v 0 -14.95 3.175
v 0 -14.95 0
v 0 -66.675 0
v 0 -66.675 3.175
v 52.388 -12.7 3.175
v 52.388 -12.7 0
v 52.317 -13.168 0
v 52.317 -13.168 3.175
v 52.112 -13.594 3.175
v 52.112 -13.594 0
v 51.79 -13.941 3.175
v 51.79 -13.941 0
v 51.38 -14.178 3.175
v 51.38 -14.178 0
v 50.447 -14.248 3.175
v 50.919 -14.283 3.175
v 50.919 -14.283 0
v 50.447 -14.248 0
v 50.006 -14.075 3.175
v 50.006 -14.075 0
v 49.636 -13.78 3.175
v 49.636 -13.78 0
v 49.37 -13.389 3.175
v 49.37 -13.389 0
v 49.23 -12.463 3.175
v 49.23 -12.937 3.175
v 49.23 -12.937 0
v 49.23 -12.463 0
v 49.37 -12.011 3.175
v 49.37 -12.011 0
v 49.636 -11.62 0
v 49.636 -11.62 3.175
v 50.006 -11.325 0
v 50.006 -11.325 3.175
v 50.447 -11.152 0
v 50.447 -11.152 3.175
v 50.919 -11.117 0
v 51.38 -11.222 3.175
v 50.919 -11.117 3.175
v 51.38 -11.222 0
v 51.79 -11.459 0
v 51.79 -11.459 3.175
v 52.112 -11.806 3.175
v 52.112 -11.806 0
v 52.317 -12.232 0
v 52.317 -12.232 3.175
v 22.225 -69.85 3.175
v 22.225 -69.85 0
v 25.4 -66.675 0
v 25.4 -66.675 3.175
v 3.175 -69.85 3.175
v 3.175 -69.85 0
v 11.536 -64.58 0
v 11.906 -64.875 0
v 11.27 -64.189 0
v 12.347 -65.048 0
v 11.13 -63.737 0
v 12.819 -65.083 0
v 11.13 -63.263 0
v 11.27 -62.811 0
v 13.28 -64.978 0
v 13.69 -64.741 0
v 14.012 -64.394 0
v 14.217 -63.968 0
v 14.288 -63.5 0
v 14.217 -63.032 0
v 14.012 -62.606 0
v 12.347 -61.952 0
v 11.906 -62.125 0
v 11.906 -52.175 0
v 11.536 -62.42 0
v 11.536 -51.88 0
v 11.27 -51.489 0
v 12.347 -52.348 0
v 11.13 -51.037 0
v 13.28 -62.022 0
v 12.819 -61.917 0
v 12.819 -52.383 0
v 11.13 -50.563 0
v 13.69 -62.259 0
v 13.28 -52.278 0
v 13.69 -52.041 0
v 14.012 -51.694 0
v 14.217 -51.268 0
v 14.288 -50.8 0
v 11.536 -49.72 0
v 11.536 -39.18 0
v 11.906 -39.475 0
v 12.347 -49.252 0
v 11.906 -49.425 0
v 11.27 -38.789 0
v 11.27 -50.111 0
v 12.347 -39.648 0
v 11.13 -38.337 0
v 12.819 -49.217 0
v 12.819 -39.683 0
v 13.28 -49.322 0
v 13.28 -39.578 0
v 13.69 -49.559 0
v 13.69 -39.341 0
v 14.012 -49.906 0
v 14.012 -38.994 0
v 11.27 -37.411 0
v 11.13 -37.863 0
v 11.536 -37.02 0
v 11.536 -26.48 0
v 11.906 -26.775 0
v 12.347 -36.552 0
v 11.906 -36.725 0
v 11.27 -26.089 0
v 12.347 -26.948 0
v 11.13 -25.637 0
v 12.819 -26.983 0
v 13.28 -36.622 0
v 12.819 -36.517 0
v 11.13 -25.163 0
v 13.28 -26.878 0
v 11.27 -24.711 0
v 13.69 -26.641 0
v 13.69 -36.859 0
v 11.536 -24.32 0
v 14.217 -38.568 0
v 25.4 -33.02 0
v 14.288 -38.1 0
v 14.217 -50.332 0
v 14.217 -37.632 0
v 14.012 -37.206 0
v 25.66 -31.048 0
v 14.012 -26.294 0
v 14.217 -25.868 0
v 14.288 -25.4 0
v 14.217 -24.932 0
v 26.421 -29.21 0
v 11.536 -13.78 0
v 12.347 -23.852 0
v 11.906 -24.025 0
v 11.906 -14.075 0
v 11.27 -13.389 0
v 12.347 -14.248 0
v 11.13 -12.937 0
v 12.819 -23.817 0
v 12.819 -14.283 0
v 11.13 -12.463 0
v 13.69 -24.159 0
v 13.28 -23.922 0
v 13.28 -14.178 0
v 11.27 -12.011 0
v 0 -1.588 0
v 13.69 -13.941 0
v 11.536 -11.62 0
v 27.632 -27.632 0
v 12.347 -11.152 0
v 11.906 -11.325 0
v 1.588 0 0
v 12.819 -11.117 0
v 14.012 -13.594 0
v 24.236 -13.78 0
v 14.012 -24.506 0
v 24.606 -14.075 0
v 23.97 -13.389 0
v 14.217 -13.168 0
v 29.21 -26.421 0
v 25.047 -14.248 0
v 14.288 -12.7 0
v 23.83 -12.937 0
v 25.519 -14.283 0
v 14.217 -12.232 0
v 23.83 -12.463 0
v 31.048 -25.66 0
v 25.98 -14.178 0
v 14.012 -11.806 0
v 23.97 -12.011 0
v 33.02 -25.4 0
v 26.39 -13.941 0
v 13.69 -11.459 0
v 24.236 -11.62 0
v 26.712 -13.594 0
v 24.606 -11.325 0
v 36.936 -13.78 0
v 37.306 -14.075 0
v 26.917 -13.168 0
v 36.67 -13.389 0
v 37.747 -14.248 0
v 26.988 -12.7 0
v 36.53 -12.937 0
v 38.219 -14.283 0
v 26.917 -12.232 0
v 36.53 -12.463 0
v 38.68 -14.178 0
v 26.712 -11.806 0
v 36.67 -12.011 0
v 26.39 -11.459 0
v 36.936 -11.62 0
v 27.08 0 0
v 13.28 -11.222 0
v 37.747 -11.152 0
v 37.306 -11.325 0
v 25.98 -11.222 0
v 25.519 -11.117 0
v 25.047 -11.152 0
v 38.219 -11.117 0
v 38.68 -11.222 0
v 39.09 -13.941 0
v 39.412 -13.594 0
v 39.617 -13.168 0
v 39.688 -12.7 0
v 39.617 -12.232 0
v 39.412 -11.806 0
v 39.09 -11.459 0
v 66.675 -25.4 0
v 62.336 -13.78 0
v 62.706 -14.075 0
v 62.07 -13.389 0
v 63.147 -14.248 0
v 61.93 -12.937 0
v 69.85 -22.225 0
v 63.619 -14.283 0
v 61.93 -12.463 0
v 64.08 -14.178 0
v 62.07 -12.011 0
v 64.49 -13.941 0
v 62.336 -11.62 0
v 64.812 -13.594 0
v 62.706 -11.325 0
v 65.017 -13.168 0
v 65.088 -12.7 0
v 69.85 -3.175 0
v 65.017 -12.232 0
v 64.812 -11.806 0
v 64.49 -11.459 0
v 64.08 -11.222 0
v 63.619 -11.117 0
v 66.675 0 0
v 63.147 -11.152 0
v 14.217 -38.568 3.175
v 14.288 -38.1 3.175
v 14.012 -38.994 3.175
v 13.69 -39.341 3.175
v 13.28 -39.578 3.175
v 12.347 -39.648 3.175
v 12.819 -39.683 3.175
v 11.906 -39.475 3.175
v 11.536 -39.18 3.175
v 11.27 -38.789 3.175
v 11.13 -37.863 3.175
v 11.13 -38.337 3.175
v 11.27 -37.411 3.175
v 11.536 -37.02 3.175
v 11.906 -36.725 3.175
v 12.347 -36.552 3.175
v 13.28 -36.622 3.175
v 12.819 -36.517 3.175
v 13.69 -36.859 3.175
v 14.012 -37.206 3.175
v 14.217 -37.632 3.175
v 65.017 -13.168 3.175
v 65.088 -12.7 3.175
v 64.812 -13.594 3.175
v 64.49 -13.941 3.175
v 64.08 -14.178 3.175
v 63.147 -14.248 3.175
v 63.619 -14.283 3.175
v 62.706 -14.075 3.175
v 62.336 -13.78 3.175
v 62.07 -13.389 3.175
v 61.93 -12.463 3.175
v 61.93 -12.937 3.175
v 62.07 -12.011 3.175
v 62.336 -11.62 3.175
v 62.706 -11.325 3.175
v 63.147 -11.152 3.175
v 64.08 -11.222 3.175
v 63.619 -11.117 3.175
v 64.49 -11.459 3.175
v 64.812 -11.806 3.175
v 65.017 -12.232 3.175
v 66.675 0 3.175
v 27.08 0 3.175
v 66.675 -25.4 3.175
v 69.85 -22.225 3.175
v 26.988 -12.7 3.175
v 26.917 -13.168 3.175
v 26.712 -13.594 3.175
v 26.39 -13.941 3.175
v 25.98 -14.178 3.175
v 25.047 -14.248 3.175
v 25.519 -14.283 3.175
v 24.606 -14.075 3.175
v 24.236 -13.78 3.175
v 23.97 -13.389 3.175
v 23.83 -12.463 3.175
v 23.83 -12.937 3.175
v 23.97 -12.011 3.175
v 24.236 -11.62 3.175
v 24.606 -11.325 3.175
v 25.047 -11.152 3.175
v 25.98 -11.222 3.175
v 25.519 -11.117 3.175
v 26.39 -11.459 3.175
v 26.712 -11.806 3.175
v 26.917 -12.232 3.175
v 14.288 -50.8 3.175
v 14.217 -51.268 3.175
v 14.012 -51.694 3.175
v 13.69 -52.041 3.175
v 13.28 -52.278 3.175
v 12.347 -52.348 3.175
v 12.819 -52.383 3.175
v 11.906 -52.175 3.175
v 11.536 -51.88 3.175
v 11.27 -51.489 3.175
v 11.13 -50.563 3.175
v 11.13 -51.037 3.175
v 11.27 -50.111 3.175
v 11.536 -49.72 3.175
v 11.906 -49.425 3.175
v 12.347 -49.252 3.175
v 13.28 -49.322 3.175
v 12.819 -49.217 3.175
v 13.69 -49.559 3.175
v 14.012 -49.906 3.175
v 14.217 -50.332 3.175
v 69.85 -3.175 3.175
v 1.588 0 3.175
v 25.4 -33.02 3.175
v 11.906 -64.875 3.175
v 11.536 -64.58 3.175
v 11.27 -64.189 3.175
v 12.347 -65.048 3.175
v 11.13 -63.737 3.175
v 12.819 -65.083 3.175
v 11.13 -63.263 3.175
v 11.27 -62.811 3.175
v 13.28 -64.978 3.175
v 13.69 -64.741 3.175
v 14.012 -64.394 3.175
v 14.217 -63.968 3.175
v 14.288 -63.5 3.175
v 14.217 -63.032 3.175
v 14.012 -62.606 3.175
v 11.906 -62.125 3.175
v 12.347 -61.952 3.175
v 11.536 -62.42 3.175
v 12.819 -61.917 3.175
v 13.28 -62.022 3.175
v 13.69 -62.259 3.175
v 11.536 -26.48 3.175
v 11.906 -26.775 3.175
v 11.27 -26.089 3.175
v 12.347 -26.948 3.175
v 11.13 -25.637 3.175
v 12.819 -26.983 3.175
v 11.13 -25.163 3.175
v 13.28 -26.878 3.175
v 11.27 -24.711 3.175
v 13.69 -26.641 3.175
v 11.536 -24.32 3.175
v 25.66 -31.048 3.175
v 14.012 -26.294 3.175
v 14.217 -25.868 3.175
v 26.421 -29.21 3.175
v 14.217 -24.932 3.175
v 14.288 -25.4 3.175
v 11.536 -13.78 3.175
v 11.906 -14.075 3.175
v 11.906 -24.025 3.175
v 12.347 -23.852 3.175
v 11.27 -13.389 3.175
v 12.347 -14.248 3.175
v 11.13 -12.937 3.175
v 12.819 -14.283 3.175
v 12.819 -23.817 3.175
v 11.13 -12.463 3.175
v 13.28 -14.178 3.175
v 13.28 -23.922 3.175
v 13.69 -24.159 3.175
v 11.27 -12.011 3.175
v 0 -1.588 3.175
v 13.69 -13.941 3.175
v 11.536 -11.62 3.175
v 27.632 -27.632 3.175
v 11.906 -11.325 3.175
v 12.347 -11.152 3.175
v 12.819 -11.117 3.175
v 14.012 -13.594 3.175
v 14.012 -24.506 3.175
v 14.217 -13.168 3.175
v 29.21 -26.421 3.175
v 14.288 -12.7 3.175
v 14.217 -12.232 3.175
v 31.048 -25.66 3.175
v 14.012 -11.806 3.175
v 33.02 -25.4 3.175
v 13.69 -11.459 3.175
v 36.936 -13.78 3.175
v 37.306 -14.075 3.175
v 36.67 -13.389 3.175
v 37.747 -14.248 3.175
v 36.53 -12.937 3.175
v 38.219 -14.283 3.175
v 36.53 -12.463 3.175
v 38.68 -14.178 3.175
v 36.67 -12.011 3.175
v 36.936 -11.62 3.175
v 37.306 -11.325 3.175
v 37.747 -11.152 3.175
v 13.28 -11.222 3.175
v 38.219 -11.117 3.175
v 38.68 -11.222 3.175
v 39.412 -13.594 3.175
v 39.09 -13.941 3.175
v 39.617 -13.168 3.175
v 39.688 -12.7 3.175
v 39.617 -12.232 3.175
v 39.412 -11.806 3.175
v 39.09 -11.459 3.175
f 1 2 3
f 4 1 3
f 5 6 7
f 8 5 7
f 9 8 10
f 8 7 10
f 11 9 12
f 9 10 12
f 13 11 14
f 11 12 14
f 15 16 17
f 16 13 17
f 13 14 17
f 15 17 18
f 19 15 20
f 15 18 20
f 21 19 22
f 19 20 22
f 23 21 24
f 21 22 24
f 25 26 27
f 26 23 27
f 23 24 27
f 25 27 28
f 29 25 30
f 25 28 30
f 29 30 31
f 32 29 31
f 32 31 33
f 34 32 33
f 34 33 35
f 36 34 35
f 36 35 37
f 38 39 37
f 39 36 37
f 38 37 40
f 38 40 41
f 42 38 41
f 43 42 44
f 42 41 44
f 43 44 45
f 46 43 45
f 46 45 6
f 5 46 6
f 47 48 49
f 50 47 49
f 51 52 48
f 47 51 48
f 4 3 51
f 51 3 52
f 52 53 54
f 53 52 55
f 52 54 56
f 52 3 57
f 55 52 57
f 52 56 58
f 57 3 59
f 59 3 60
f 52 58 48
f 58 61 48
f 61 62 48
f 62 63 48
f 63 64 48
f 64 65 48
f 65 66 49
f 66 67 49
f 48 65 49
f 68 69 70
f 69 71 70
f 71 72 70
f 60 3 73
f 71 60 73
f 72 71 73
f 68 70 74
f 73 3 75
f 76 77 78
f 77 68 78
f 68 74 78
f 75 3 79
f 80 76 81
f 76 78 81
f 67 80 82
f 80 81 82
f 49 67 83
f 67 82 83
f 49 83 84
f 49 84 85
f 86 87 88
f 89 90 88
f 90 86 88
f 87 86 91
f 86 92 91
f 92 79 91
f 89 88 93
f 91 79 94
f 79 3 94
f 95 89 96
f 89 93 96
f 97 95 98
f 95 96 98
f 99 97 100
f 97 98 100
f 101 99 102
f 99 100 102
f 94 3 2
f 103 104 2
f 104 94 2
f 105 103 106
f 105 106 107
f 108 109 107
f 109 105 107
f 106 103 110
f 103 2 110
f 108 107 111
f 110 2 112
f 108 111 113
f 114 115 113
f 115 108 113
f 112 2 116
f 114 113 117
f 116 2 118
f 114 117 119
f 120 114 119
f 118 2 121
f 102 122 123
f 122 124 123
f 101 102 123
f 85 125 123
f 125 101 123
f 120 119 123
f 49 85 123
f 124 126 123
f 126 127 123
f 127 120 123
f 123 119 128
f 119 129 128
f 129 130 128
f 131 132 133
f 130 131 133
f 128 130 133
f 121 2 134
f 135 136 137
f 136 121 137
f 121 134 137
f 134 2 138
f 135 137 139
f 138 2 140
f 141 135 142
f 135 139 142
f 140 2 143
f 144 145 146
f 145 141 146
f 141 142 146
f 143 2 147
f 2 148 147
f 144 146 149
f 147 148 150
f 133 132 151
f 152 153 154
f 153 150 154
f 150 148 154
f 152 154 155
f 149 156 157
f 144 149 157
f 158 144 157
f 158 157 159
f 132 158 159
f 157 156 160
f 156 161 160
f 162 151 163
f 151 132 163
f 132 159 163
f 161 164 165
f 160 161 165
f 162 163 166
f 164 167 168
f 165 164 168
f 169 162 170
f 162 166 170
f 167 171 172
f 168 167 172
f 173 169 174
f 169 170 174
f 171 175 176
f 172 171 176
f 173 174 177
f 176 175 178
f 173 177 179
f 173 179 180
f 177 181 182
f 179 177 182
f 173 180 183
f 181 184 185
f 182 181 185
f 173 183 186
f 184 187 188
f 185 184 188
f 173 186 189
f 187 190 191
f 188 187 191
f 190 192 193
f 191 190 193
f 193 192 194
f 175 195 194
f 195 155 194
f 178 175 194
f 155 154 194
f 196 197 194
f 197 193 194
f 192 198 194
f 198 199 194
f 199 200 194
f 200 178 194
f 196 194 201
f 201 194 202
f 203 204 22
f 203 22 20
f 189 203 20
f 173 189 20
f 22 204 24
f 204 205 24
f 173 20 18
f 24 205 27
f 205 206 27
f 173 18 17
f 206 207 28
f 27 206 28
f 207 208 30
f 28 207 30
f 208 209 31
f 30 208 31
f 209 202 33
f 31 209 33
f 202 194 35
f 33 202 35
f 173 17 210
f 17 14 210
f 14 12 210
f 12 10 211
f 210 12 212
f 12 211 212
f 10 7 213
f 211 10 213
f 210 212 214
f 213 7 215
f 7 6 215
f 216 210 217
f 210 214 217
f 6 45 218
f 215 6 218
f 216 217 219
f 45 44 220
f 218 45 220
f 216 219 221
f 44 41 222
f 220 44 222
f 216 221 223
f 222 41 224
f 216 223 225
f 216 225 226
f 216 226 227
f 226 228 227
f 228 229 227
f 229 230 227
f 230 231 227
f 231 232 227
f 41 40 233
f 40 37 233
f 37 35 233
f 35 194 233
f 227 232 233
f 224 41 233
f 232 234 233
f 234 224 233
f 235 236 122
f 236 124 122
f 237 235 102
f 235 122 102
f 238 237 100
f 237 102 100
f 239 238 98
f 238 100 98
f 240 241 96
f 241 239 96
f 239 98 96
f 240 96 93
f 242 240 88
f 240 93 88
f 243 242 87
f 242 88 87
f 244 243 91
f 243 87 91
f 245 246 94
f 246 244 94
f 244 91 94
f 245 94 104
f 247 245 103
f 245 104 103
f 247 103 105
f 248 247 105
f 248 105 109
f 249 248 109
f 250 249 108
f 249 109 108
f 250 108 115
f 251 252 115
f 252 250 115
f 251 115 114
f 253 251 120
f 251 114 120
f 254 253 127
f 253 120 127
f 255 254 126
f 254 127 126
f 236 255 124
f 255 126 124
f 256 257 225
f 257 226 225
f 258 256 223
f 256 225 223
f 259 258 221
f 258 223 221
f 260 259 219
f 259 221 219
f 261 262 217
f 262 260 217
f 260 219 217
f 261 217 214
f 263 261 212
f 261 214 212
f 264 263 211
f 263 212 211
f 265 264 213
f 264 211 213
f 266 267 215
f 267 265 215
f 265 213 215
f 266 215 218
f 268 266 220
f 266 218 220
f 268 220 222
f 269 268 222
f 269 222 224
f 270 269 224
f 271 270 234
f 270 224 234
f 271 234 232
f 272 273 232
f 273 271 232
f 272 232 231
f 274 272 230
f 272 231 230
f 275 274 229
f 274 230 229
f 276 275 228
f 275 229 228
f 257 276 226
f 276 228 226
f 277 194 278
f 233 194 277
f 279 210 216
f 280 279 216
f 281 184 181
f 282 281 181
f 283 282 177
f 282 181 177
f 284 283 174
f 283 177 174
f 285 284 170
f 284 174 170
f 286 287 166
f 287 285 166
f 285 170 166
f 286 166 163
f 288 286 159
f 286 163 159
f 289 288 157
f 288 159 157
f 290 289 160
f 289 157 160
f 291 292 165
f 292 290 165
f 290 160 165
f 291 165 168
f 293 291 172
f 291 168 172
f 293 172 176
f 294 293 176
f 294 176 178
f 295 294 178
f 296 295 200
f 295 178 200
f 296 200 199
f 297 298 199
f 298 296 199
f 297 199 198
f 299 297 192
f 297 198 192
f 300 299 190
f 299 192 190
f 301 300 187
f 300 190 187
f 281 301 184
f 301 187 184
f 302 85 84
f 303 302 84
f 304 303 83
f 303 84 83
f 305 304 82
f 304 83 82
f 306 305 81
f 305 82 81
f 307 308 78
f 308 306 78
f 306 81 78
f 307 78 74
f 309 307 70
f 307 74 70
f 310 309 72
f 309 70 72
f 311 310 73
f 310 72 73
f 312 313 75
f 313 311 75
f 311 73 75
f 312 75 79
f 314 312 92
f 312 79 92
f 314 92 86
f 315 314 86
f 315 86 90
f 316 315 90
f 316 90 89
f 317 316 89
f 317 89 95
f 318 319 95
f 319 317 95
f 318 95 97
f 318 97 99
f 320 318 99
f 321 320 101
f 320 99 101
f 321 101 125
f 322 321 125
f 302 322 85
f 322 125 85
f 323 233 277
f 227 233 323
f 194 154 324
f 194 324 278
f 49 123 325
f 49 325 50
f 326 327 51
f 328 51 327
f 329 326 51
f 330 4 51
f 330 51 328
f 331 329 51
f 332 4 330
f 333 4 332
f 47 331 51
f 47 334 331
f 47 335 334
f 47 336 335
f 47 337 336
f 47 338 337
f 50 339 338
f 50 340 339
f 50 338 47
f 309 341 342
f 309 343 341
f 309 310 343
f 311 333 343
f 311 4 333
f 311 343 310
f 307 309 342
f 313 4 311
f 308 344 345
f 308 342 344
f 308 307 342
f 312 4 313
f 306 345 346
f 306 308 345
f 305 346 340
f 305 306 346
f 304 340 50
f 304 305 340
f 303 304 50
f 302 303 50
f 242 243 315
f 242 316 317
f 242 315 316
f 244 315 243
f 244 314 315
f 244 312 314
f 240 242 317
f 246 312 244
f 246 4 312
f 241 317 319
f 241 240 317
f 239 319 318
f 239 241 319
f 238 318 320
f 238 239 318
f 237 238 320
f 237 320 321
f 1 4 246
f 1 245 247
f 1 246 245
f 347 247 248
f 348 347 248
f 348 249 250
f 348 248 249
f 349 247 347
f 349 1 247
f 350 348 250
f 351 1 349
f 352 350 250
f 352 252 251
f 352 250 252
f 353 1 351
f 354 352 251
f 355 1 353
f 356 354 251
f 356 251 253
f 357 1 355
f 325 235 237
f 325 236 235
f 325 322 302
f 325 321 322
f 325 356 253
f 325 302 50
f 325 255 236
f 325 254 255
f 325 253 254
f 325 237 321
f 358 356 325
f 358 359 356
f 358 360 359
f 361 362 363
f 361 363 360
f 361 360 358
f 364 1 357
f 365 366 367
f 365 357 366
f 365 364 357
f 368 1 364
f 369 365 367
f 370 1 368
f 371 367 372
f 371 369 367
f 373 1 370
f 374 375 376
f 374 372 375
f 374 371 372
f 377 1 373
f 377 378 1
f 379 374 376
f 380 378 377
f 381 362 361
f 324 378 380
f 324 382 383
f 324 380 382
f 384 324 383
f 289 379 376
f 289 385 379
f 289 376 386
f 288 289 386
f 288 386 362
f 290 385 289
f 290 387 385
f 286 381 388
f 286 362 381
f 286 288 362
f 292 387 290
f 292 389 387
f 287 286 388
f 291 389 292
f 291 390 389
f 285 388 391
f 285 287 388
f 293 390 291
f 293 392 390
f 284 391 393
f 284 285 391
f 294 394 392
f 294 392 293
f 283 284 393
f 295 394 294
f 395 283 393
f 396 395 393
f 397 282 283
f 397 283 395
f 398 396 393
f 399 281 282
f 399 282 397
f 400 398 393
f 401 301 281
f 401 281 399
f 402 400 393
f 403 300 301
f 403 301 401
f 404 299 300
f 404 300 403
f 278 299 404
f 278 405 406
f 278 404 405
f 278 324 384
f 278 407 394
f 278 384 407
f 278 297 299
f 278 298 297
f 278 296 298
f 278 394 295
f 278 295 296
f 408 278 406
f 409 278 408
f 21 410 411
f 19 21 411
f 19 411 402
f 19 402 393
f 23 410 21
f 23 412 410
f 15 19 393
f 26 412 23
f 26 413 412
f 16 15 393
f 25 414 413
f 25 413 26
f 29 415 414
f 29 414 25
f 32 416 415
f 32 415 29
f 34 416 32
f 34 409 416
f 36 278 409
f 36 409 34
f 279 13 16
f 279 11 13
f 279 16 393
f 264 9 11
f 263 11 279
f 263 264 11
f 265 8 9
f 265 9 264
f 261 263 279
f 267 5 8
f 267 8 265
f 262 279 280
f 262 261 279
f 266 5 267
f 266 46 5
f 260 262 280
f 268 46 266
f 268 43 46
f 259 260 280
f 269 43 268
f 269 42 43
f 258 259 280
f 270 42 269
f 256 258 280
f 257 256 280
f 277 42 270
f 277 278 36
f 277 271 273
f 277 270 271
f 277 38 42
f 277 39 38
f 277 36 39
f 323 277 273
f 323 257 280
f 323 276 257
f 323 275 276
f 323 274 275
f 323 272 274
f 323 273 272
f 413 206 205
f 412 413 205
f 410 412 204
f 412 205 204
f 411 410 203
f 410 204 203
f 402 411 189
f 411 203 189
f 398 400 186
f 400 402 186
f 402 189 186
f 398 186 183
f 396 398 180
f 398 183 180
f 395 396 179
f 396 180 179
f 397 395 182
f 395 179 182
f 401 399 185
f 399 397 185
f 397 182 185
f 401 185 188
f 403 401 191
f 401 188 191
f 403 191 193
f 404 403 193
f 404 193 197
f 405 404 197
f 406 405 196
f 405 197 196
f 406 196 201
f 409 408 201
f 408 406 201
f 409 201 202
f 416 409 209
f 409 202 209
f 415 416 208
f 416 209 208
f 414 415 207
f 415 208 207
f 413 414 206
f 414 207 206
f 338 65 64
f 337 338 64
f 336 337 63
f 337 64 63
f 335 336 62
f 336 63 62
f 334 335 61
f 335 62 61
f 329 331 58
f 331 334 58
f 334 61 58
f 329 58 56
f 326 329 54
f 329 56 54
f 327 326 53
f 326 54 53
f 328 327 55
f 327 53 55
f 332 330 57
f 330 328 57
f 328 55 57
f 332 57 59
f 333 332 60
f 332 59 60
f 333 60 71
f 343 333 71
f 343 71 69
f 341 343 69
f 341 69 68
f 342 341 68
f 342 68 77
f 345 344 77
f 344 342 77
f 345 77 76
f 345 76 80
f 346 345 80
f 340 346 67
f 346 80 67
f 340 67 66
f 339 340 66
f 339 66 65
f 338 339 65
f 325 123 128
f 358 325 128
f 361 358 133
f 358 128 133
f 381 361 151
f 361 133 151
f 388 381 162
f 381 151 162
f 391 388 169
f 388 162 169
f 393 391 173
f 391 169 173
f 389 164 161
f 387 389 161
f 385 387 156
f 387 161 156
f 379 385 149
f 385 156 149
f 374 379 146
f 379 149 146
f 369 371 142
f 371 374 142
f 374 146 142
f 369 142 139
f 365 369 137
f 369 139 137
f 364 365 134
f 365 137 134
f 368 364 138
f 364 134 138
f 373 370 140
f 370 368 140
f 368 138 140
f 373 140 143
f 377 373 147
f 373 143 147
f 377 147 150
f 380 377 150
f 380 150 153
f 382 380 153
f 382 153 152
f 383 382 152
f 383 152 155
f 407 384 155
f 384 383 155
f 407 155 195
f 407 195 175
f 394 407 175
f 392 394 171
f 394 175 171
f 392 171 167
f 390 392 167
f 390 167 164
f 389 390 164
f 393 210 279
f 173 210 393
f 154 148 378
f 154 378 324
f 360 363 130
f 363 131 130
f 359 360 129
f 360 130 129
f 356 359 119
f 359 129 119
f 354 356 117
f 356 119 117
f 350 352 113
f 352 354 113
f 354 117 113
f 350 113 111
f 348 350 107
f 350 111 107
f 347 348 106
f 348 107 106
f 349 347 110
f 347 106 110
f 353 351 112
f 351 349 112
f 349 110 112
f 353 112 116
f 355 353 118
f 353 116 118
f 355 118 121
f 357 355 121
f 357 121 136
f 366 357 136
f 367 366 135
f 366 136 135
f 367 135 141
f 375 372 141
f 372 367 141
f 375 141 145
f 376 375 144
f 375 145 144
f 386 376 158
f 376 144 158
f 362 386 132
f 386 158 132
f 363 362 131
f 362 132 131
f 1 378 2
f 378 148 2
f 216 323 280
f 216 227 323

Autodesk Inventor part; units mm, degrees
ref_plane "YZ Plane" through (0, 0, 0) normal (1, 0, 0) x (0, 1, 0)
ref_plane "XZ Plane" through (0, 0, 0) normal (0, 1, 0) x (-1, 0, 0)
ref_plane "XY Plane" through (0, 0, 0) normal (0, 0, 1) x (1, 0, 0)
sketch "Sketch1" plane through (0, 0, 0) normal (0, 0, 1) x (1, 0, 0)
  circle A0 centre (12.7, -12.7) radius 1.5875
  line L0 (0, 0) -> (0, -14.9496)
  line L1 (0, 0) -> (27.0799, 0)
  circle A1 centre (25.4, -12.7) radius 1.5875
  circle A2 centre (38.1, -12.7) radius 1.5875
  circle A3 centre (50.8, -12.7) radius 1.5875
  circle A4 centre (63.5, -12.7) radius 1.5875
  circle A5 centre (12.7, -25.4) radius 1.5875
  circle A6 centre (12.7, -38.1) radius 1.5875
  circle A7 centre (12.7, -50.8) radius 1.5875
  circle A8 centre (12.7, -63.5) radius 1.5875
  line L2 (27.0799, 0) -> (66.675, 0)
  line L3 (69.85, -3.175) -> (69.85, -22.225)
  line L4 (0, -14.9496) -> (0, -66.675)
  line L5 (3.175, -69.85) -> (22.225, -69.85)
  line L6 (66.675, -25.4) -> (33.02, -25.4)
  line L7 (25.4, -33.02) -> (25.4, -66.675)
  arc A9 (33.02, -25.4) -> (25.4, -33.02) centre (33.02, -33.02) ccw
  line L8 (66.675, 0) -> (69.85, -3.175)
  line L9 (66.675, -25.4) -> (69.85, -22.225)
  line L10 (0, -66.675) -> (3.175, -69.85)
  line L11 (22.225, -69.85) -> (25.4, -66.675)
  line L12 (0, -1.5875) -> (1.5875, 0)
  point P0 (69.85, 0)
  point P1 (69.85, -25.4)
  point P2 (69.85, -12.7)
  point P3 (0, -69.85)
  point P4 (25.4, -69.85)
  dimension "d0" = 3.175
  dimension "d1" = 12.7
  dimension "d2" = 12.7
  dimension "d5" = 12.7
  dimension "d12" = 12.7
  dimension "d17" = 6.35
  dimension "d18" = 25.4
  dimension "d19" = 6.35
  dimension "d20" = 25.4
  dimension "d21" = 7.62
  dimension "d22" = 3.175
  dimension "d23" = 3.175
  dimension "d24" = 3.175
  dimension "d25" = 3.175
  dimension "d26" = 3.175
  dimension "d27" = 3.175
  dimension "d28" = 3.175
  dimension "d29" = 3.175
extrude "Extrusion1" add sketch "Sketch1" along normal blind 3.175 contours L12 L1 L2 L8 L3 L9 L6 A9 L7 L11 L5 L10 L4 L0
equation "\"d23\" = d22"
equation "\"d24\" = d22"
equation "\"d25\" = d24"
equation "\"d26\" = d22"
equation "\"d27\" = d26"
equation "\"d28\" = d22"
equation "\"d29\" = d28"
properties part number "L-Bracket"
